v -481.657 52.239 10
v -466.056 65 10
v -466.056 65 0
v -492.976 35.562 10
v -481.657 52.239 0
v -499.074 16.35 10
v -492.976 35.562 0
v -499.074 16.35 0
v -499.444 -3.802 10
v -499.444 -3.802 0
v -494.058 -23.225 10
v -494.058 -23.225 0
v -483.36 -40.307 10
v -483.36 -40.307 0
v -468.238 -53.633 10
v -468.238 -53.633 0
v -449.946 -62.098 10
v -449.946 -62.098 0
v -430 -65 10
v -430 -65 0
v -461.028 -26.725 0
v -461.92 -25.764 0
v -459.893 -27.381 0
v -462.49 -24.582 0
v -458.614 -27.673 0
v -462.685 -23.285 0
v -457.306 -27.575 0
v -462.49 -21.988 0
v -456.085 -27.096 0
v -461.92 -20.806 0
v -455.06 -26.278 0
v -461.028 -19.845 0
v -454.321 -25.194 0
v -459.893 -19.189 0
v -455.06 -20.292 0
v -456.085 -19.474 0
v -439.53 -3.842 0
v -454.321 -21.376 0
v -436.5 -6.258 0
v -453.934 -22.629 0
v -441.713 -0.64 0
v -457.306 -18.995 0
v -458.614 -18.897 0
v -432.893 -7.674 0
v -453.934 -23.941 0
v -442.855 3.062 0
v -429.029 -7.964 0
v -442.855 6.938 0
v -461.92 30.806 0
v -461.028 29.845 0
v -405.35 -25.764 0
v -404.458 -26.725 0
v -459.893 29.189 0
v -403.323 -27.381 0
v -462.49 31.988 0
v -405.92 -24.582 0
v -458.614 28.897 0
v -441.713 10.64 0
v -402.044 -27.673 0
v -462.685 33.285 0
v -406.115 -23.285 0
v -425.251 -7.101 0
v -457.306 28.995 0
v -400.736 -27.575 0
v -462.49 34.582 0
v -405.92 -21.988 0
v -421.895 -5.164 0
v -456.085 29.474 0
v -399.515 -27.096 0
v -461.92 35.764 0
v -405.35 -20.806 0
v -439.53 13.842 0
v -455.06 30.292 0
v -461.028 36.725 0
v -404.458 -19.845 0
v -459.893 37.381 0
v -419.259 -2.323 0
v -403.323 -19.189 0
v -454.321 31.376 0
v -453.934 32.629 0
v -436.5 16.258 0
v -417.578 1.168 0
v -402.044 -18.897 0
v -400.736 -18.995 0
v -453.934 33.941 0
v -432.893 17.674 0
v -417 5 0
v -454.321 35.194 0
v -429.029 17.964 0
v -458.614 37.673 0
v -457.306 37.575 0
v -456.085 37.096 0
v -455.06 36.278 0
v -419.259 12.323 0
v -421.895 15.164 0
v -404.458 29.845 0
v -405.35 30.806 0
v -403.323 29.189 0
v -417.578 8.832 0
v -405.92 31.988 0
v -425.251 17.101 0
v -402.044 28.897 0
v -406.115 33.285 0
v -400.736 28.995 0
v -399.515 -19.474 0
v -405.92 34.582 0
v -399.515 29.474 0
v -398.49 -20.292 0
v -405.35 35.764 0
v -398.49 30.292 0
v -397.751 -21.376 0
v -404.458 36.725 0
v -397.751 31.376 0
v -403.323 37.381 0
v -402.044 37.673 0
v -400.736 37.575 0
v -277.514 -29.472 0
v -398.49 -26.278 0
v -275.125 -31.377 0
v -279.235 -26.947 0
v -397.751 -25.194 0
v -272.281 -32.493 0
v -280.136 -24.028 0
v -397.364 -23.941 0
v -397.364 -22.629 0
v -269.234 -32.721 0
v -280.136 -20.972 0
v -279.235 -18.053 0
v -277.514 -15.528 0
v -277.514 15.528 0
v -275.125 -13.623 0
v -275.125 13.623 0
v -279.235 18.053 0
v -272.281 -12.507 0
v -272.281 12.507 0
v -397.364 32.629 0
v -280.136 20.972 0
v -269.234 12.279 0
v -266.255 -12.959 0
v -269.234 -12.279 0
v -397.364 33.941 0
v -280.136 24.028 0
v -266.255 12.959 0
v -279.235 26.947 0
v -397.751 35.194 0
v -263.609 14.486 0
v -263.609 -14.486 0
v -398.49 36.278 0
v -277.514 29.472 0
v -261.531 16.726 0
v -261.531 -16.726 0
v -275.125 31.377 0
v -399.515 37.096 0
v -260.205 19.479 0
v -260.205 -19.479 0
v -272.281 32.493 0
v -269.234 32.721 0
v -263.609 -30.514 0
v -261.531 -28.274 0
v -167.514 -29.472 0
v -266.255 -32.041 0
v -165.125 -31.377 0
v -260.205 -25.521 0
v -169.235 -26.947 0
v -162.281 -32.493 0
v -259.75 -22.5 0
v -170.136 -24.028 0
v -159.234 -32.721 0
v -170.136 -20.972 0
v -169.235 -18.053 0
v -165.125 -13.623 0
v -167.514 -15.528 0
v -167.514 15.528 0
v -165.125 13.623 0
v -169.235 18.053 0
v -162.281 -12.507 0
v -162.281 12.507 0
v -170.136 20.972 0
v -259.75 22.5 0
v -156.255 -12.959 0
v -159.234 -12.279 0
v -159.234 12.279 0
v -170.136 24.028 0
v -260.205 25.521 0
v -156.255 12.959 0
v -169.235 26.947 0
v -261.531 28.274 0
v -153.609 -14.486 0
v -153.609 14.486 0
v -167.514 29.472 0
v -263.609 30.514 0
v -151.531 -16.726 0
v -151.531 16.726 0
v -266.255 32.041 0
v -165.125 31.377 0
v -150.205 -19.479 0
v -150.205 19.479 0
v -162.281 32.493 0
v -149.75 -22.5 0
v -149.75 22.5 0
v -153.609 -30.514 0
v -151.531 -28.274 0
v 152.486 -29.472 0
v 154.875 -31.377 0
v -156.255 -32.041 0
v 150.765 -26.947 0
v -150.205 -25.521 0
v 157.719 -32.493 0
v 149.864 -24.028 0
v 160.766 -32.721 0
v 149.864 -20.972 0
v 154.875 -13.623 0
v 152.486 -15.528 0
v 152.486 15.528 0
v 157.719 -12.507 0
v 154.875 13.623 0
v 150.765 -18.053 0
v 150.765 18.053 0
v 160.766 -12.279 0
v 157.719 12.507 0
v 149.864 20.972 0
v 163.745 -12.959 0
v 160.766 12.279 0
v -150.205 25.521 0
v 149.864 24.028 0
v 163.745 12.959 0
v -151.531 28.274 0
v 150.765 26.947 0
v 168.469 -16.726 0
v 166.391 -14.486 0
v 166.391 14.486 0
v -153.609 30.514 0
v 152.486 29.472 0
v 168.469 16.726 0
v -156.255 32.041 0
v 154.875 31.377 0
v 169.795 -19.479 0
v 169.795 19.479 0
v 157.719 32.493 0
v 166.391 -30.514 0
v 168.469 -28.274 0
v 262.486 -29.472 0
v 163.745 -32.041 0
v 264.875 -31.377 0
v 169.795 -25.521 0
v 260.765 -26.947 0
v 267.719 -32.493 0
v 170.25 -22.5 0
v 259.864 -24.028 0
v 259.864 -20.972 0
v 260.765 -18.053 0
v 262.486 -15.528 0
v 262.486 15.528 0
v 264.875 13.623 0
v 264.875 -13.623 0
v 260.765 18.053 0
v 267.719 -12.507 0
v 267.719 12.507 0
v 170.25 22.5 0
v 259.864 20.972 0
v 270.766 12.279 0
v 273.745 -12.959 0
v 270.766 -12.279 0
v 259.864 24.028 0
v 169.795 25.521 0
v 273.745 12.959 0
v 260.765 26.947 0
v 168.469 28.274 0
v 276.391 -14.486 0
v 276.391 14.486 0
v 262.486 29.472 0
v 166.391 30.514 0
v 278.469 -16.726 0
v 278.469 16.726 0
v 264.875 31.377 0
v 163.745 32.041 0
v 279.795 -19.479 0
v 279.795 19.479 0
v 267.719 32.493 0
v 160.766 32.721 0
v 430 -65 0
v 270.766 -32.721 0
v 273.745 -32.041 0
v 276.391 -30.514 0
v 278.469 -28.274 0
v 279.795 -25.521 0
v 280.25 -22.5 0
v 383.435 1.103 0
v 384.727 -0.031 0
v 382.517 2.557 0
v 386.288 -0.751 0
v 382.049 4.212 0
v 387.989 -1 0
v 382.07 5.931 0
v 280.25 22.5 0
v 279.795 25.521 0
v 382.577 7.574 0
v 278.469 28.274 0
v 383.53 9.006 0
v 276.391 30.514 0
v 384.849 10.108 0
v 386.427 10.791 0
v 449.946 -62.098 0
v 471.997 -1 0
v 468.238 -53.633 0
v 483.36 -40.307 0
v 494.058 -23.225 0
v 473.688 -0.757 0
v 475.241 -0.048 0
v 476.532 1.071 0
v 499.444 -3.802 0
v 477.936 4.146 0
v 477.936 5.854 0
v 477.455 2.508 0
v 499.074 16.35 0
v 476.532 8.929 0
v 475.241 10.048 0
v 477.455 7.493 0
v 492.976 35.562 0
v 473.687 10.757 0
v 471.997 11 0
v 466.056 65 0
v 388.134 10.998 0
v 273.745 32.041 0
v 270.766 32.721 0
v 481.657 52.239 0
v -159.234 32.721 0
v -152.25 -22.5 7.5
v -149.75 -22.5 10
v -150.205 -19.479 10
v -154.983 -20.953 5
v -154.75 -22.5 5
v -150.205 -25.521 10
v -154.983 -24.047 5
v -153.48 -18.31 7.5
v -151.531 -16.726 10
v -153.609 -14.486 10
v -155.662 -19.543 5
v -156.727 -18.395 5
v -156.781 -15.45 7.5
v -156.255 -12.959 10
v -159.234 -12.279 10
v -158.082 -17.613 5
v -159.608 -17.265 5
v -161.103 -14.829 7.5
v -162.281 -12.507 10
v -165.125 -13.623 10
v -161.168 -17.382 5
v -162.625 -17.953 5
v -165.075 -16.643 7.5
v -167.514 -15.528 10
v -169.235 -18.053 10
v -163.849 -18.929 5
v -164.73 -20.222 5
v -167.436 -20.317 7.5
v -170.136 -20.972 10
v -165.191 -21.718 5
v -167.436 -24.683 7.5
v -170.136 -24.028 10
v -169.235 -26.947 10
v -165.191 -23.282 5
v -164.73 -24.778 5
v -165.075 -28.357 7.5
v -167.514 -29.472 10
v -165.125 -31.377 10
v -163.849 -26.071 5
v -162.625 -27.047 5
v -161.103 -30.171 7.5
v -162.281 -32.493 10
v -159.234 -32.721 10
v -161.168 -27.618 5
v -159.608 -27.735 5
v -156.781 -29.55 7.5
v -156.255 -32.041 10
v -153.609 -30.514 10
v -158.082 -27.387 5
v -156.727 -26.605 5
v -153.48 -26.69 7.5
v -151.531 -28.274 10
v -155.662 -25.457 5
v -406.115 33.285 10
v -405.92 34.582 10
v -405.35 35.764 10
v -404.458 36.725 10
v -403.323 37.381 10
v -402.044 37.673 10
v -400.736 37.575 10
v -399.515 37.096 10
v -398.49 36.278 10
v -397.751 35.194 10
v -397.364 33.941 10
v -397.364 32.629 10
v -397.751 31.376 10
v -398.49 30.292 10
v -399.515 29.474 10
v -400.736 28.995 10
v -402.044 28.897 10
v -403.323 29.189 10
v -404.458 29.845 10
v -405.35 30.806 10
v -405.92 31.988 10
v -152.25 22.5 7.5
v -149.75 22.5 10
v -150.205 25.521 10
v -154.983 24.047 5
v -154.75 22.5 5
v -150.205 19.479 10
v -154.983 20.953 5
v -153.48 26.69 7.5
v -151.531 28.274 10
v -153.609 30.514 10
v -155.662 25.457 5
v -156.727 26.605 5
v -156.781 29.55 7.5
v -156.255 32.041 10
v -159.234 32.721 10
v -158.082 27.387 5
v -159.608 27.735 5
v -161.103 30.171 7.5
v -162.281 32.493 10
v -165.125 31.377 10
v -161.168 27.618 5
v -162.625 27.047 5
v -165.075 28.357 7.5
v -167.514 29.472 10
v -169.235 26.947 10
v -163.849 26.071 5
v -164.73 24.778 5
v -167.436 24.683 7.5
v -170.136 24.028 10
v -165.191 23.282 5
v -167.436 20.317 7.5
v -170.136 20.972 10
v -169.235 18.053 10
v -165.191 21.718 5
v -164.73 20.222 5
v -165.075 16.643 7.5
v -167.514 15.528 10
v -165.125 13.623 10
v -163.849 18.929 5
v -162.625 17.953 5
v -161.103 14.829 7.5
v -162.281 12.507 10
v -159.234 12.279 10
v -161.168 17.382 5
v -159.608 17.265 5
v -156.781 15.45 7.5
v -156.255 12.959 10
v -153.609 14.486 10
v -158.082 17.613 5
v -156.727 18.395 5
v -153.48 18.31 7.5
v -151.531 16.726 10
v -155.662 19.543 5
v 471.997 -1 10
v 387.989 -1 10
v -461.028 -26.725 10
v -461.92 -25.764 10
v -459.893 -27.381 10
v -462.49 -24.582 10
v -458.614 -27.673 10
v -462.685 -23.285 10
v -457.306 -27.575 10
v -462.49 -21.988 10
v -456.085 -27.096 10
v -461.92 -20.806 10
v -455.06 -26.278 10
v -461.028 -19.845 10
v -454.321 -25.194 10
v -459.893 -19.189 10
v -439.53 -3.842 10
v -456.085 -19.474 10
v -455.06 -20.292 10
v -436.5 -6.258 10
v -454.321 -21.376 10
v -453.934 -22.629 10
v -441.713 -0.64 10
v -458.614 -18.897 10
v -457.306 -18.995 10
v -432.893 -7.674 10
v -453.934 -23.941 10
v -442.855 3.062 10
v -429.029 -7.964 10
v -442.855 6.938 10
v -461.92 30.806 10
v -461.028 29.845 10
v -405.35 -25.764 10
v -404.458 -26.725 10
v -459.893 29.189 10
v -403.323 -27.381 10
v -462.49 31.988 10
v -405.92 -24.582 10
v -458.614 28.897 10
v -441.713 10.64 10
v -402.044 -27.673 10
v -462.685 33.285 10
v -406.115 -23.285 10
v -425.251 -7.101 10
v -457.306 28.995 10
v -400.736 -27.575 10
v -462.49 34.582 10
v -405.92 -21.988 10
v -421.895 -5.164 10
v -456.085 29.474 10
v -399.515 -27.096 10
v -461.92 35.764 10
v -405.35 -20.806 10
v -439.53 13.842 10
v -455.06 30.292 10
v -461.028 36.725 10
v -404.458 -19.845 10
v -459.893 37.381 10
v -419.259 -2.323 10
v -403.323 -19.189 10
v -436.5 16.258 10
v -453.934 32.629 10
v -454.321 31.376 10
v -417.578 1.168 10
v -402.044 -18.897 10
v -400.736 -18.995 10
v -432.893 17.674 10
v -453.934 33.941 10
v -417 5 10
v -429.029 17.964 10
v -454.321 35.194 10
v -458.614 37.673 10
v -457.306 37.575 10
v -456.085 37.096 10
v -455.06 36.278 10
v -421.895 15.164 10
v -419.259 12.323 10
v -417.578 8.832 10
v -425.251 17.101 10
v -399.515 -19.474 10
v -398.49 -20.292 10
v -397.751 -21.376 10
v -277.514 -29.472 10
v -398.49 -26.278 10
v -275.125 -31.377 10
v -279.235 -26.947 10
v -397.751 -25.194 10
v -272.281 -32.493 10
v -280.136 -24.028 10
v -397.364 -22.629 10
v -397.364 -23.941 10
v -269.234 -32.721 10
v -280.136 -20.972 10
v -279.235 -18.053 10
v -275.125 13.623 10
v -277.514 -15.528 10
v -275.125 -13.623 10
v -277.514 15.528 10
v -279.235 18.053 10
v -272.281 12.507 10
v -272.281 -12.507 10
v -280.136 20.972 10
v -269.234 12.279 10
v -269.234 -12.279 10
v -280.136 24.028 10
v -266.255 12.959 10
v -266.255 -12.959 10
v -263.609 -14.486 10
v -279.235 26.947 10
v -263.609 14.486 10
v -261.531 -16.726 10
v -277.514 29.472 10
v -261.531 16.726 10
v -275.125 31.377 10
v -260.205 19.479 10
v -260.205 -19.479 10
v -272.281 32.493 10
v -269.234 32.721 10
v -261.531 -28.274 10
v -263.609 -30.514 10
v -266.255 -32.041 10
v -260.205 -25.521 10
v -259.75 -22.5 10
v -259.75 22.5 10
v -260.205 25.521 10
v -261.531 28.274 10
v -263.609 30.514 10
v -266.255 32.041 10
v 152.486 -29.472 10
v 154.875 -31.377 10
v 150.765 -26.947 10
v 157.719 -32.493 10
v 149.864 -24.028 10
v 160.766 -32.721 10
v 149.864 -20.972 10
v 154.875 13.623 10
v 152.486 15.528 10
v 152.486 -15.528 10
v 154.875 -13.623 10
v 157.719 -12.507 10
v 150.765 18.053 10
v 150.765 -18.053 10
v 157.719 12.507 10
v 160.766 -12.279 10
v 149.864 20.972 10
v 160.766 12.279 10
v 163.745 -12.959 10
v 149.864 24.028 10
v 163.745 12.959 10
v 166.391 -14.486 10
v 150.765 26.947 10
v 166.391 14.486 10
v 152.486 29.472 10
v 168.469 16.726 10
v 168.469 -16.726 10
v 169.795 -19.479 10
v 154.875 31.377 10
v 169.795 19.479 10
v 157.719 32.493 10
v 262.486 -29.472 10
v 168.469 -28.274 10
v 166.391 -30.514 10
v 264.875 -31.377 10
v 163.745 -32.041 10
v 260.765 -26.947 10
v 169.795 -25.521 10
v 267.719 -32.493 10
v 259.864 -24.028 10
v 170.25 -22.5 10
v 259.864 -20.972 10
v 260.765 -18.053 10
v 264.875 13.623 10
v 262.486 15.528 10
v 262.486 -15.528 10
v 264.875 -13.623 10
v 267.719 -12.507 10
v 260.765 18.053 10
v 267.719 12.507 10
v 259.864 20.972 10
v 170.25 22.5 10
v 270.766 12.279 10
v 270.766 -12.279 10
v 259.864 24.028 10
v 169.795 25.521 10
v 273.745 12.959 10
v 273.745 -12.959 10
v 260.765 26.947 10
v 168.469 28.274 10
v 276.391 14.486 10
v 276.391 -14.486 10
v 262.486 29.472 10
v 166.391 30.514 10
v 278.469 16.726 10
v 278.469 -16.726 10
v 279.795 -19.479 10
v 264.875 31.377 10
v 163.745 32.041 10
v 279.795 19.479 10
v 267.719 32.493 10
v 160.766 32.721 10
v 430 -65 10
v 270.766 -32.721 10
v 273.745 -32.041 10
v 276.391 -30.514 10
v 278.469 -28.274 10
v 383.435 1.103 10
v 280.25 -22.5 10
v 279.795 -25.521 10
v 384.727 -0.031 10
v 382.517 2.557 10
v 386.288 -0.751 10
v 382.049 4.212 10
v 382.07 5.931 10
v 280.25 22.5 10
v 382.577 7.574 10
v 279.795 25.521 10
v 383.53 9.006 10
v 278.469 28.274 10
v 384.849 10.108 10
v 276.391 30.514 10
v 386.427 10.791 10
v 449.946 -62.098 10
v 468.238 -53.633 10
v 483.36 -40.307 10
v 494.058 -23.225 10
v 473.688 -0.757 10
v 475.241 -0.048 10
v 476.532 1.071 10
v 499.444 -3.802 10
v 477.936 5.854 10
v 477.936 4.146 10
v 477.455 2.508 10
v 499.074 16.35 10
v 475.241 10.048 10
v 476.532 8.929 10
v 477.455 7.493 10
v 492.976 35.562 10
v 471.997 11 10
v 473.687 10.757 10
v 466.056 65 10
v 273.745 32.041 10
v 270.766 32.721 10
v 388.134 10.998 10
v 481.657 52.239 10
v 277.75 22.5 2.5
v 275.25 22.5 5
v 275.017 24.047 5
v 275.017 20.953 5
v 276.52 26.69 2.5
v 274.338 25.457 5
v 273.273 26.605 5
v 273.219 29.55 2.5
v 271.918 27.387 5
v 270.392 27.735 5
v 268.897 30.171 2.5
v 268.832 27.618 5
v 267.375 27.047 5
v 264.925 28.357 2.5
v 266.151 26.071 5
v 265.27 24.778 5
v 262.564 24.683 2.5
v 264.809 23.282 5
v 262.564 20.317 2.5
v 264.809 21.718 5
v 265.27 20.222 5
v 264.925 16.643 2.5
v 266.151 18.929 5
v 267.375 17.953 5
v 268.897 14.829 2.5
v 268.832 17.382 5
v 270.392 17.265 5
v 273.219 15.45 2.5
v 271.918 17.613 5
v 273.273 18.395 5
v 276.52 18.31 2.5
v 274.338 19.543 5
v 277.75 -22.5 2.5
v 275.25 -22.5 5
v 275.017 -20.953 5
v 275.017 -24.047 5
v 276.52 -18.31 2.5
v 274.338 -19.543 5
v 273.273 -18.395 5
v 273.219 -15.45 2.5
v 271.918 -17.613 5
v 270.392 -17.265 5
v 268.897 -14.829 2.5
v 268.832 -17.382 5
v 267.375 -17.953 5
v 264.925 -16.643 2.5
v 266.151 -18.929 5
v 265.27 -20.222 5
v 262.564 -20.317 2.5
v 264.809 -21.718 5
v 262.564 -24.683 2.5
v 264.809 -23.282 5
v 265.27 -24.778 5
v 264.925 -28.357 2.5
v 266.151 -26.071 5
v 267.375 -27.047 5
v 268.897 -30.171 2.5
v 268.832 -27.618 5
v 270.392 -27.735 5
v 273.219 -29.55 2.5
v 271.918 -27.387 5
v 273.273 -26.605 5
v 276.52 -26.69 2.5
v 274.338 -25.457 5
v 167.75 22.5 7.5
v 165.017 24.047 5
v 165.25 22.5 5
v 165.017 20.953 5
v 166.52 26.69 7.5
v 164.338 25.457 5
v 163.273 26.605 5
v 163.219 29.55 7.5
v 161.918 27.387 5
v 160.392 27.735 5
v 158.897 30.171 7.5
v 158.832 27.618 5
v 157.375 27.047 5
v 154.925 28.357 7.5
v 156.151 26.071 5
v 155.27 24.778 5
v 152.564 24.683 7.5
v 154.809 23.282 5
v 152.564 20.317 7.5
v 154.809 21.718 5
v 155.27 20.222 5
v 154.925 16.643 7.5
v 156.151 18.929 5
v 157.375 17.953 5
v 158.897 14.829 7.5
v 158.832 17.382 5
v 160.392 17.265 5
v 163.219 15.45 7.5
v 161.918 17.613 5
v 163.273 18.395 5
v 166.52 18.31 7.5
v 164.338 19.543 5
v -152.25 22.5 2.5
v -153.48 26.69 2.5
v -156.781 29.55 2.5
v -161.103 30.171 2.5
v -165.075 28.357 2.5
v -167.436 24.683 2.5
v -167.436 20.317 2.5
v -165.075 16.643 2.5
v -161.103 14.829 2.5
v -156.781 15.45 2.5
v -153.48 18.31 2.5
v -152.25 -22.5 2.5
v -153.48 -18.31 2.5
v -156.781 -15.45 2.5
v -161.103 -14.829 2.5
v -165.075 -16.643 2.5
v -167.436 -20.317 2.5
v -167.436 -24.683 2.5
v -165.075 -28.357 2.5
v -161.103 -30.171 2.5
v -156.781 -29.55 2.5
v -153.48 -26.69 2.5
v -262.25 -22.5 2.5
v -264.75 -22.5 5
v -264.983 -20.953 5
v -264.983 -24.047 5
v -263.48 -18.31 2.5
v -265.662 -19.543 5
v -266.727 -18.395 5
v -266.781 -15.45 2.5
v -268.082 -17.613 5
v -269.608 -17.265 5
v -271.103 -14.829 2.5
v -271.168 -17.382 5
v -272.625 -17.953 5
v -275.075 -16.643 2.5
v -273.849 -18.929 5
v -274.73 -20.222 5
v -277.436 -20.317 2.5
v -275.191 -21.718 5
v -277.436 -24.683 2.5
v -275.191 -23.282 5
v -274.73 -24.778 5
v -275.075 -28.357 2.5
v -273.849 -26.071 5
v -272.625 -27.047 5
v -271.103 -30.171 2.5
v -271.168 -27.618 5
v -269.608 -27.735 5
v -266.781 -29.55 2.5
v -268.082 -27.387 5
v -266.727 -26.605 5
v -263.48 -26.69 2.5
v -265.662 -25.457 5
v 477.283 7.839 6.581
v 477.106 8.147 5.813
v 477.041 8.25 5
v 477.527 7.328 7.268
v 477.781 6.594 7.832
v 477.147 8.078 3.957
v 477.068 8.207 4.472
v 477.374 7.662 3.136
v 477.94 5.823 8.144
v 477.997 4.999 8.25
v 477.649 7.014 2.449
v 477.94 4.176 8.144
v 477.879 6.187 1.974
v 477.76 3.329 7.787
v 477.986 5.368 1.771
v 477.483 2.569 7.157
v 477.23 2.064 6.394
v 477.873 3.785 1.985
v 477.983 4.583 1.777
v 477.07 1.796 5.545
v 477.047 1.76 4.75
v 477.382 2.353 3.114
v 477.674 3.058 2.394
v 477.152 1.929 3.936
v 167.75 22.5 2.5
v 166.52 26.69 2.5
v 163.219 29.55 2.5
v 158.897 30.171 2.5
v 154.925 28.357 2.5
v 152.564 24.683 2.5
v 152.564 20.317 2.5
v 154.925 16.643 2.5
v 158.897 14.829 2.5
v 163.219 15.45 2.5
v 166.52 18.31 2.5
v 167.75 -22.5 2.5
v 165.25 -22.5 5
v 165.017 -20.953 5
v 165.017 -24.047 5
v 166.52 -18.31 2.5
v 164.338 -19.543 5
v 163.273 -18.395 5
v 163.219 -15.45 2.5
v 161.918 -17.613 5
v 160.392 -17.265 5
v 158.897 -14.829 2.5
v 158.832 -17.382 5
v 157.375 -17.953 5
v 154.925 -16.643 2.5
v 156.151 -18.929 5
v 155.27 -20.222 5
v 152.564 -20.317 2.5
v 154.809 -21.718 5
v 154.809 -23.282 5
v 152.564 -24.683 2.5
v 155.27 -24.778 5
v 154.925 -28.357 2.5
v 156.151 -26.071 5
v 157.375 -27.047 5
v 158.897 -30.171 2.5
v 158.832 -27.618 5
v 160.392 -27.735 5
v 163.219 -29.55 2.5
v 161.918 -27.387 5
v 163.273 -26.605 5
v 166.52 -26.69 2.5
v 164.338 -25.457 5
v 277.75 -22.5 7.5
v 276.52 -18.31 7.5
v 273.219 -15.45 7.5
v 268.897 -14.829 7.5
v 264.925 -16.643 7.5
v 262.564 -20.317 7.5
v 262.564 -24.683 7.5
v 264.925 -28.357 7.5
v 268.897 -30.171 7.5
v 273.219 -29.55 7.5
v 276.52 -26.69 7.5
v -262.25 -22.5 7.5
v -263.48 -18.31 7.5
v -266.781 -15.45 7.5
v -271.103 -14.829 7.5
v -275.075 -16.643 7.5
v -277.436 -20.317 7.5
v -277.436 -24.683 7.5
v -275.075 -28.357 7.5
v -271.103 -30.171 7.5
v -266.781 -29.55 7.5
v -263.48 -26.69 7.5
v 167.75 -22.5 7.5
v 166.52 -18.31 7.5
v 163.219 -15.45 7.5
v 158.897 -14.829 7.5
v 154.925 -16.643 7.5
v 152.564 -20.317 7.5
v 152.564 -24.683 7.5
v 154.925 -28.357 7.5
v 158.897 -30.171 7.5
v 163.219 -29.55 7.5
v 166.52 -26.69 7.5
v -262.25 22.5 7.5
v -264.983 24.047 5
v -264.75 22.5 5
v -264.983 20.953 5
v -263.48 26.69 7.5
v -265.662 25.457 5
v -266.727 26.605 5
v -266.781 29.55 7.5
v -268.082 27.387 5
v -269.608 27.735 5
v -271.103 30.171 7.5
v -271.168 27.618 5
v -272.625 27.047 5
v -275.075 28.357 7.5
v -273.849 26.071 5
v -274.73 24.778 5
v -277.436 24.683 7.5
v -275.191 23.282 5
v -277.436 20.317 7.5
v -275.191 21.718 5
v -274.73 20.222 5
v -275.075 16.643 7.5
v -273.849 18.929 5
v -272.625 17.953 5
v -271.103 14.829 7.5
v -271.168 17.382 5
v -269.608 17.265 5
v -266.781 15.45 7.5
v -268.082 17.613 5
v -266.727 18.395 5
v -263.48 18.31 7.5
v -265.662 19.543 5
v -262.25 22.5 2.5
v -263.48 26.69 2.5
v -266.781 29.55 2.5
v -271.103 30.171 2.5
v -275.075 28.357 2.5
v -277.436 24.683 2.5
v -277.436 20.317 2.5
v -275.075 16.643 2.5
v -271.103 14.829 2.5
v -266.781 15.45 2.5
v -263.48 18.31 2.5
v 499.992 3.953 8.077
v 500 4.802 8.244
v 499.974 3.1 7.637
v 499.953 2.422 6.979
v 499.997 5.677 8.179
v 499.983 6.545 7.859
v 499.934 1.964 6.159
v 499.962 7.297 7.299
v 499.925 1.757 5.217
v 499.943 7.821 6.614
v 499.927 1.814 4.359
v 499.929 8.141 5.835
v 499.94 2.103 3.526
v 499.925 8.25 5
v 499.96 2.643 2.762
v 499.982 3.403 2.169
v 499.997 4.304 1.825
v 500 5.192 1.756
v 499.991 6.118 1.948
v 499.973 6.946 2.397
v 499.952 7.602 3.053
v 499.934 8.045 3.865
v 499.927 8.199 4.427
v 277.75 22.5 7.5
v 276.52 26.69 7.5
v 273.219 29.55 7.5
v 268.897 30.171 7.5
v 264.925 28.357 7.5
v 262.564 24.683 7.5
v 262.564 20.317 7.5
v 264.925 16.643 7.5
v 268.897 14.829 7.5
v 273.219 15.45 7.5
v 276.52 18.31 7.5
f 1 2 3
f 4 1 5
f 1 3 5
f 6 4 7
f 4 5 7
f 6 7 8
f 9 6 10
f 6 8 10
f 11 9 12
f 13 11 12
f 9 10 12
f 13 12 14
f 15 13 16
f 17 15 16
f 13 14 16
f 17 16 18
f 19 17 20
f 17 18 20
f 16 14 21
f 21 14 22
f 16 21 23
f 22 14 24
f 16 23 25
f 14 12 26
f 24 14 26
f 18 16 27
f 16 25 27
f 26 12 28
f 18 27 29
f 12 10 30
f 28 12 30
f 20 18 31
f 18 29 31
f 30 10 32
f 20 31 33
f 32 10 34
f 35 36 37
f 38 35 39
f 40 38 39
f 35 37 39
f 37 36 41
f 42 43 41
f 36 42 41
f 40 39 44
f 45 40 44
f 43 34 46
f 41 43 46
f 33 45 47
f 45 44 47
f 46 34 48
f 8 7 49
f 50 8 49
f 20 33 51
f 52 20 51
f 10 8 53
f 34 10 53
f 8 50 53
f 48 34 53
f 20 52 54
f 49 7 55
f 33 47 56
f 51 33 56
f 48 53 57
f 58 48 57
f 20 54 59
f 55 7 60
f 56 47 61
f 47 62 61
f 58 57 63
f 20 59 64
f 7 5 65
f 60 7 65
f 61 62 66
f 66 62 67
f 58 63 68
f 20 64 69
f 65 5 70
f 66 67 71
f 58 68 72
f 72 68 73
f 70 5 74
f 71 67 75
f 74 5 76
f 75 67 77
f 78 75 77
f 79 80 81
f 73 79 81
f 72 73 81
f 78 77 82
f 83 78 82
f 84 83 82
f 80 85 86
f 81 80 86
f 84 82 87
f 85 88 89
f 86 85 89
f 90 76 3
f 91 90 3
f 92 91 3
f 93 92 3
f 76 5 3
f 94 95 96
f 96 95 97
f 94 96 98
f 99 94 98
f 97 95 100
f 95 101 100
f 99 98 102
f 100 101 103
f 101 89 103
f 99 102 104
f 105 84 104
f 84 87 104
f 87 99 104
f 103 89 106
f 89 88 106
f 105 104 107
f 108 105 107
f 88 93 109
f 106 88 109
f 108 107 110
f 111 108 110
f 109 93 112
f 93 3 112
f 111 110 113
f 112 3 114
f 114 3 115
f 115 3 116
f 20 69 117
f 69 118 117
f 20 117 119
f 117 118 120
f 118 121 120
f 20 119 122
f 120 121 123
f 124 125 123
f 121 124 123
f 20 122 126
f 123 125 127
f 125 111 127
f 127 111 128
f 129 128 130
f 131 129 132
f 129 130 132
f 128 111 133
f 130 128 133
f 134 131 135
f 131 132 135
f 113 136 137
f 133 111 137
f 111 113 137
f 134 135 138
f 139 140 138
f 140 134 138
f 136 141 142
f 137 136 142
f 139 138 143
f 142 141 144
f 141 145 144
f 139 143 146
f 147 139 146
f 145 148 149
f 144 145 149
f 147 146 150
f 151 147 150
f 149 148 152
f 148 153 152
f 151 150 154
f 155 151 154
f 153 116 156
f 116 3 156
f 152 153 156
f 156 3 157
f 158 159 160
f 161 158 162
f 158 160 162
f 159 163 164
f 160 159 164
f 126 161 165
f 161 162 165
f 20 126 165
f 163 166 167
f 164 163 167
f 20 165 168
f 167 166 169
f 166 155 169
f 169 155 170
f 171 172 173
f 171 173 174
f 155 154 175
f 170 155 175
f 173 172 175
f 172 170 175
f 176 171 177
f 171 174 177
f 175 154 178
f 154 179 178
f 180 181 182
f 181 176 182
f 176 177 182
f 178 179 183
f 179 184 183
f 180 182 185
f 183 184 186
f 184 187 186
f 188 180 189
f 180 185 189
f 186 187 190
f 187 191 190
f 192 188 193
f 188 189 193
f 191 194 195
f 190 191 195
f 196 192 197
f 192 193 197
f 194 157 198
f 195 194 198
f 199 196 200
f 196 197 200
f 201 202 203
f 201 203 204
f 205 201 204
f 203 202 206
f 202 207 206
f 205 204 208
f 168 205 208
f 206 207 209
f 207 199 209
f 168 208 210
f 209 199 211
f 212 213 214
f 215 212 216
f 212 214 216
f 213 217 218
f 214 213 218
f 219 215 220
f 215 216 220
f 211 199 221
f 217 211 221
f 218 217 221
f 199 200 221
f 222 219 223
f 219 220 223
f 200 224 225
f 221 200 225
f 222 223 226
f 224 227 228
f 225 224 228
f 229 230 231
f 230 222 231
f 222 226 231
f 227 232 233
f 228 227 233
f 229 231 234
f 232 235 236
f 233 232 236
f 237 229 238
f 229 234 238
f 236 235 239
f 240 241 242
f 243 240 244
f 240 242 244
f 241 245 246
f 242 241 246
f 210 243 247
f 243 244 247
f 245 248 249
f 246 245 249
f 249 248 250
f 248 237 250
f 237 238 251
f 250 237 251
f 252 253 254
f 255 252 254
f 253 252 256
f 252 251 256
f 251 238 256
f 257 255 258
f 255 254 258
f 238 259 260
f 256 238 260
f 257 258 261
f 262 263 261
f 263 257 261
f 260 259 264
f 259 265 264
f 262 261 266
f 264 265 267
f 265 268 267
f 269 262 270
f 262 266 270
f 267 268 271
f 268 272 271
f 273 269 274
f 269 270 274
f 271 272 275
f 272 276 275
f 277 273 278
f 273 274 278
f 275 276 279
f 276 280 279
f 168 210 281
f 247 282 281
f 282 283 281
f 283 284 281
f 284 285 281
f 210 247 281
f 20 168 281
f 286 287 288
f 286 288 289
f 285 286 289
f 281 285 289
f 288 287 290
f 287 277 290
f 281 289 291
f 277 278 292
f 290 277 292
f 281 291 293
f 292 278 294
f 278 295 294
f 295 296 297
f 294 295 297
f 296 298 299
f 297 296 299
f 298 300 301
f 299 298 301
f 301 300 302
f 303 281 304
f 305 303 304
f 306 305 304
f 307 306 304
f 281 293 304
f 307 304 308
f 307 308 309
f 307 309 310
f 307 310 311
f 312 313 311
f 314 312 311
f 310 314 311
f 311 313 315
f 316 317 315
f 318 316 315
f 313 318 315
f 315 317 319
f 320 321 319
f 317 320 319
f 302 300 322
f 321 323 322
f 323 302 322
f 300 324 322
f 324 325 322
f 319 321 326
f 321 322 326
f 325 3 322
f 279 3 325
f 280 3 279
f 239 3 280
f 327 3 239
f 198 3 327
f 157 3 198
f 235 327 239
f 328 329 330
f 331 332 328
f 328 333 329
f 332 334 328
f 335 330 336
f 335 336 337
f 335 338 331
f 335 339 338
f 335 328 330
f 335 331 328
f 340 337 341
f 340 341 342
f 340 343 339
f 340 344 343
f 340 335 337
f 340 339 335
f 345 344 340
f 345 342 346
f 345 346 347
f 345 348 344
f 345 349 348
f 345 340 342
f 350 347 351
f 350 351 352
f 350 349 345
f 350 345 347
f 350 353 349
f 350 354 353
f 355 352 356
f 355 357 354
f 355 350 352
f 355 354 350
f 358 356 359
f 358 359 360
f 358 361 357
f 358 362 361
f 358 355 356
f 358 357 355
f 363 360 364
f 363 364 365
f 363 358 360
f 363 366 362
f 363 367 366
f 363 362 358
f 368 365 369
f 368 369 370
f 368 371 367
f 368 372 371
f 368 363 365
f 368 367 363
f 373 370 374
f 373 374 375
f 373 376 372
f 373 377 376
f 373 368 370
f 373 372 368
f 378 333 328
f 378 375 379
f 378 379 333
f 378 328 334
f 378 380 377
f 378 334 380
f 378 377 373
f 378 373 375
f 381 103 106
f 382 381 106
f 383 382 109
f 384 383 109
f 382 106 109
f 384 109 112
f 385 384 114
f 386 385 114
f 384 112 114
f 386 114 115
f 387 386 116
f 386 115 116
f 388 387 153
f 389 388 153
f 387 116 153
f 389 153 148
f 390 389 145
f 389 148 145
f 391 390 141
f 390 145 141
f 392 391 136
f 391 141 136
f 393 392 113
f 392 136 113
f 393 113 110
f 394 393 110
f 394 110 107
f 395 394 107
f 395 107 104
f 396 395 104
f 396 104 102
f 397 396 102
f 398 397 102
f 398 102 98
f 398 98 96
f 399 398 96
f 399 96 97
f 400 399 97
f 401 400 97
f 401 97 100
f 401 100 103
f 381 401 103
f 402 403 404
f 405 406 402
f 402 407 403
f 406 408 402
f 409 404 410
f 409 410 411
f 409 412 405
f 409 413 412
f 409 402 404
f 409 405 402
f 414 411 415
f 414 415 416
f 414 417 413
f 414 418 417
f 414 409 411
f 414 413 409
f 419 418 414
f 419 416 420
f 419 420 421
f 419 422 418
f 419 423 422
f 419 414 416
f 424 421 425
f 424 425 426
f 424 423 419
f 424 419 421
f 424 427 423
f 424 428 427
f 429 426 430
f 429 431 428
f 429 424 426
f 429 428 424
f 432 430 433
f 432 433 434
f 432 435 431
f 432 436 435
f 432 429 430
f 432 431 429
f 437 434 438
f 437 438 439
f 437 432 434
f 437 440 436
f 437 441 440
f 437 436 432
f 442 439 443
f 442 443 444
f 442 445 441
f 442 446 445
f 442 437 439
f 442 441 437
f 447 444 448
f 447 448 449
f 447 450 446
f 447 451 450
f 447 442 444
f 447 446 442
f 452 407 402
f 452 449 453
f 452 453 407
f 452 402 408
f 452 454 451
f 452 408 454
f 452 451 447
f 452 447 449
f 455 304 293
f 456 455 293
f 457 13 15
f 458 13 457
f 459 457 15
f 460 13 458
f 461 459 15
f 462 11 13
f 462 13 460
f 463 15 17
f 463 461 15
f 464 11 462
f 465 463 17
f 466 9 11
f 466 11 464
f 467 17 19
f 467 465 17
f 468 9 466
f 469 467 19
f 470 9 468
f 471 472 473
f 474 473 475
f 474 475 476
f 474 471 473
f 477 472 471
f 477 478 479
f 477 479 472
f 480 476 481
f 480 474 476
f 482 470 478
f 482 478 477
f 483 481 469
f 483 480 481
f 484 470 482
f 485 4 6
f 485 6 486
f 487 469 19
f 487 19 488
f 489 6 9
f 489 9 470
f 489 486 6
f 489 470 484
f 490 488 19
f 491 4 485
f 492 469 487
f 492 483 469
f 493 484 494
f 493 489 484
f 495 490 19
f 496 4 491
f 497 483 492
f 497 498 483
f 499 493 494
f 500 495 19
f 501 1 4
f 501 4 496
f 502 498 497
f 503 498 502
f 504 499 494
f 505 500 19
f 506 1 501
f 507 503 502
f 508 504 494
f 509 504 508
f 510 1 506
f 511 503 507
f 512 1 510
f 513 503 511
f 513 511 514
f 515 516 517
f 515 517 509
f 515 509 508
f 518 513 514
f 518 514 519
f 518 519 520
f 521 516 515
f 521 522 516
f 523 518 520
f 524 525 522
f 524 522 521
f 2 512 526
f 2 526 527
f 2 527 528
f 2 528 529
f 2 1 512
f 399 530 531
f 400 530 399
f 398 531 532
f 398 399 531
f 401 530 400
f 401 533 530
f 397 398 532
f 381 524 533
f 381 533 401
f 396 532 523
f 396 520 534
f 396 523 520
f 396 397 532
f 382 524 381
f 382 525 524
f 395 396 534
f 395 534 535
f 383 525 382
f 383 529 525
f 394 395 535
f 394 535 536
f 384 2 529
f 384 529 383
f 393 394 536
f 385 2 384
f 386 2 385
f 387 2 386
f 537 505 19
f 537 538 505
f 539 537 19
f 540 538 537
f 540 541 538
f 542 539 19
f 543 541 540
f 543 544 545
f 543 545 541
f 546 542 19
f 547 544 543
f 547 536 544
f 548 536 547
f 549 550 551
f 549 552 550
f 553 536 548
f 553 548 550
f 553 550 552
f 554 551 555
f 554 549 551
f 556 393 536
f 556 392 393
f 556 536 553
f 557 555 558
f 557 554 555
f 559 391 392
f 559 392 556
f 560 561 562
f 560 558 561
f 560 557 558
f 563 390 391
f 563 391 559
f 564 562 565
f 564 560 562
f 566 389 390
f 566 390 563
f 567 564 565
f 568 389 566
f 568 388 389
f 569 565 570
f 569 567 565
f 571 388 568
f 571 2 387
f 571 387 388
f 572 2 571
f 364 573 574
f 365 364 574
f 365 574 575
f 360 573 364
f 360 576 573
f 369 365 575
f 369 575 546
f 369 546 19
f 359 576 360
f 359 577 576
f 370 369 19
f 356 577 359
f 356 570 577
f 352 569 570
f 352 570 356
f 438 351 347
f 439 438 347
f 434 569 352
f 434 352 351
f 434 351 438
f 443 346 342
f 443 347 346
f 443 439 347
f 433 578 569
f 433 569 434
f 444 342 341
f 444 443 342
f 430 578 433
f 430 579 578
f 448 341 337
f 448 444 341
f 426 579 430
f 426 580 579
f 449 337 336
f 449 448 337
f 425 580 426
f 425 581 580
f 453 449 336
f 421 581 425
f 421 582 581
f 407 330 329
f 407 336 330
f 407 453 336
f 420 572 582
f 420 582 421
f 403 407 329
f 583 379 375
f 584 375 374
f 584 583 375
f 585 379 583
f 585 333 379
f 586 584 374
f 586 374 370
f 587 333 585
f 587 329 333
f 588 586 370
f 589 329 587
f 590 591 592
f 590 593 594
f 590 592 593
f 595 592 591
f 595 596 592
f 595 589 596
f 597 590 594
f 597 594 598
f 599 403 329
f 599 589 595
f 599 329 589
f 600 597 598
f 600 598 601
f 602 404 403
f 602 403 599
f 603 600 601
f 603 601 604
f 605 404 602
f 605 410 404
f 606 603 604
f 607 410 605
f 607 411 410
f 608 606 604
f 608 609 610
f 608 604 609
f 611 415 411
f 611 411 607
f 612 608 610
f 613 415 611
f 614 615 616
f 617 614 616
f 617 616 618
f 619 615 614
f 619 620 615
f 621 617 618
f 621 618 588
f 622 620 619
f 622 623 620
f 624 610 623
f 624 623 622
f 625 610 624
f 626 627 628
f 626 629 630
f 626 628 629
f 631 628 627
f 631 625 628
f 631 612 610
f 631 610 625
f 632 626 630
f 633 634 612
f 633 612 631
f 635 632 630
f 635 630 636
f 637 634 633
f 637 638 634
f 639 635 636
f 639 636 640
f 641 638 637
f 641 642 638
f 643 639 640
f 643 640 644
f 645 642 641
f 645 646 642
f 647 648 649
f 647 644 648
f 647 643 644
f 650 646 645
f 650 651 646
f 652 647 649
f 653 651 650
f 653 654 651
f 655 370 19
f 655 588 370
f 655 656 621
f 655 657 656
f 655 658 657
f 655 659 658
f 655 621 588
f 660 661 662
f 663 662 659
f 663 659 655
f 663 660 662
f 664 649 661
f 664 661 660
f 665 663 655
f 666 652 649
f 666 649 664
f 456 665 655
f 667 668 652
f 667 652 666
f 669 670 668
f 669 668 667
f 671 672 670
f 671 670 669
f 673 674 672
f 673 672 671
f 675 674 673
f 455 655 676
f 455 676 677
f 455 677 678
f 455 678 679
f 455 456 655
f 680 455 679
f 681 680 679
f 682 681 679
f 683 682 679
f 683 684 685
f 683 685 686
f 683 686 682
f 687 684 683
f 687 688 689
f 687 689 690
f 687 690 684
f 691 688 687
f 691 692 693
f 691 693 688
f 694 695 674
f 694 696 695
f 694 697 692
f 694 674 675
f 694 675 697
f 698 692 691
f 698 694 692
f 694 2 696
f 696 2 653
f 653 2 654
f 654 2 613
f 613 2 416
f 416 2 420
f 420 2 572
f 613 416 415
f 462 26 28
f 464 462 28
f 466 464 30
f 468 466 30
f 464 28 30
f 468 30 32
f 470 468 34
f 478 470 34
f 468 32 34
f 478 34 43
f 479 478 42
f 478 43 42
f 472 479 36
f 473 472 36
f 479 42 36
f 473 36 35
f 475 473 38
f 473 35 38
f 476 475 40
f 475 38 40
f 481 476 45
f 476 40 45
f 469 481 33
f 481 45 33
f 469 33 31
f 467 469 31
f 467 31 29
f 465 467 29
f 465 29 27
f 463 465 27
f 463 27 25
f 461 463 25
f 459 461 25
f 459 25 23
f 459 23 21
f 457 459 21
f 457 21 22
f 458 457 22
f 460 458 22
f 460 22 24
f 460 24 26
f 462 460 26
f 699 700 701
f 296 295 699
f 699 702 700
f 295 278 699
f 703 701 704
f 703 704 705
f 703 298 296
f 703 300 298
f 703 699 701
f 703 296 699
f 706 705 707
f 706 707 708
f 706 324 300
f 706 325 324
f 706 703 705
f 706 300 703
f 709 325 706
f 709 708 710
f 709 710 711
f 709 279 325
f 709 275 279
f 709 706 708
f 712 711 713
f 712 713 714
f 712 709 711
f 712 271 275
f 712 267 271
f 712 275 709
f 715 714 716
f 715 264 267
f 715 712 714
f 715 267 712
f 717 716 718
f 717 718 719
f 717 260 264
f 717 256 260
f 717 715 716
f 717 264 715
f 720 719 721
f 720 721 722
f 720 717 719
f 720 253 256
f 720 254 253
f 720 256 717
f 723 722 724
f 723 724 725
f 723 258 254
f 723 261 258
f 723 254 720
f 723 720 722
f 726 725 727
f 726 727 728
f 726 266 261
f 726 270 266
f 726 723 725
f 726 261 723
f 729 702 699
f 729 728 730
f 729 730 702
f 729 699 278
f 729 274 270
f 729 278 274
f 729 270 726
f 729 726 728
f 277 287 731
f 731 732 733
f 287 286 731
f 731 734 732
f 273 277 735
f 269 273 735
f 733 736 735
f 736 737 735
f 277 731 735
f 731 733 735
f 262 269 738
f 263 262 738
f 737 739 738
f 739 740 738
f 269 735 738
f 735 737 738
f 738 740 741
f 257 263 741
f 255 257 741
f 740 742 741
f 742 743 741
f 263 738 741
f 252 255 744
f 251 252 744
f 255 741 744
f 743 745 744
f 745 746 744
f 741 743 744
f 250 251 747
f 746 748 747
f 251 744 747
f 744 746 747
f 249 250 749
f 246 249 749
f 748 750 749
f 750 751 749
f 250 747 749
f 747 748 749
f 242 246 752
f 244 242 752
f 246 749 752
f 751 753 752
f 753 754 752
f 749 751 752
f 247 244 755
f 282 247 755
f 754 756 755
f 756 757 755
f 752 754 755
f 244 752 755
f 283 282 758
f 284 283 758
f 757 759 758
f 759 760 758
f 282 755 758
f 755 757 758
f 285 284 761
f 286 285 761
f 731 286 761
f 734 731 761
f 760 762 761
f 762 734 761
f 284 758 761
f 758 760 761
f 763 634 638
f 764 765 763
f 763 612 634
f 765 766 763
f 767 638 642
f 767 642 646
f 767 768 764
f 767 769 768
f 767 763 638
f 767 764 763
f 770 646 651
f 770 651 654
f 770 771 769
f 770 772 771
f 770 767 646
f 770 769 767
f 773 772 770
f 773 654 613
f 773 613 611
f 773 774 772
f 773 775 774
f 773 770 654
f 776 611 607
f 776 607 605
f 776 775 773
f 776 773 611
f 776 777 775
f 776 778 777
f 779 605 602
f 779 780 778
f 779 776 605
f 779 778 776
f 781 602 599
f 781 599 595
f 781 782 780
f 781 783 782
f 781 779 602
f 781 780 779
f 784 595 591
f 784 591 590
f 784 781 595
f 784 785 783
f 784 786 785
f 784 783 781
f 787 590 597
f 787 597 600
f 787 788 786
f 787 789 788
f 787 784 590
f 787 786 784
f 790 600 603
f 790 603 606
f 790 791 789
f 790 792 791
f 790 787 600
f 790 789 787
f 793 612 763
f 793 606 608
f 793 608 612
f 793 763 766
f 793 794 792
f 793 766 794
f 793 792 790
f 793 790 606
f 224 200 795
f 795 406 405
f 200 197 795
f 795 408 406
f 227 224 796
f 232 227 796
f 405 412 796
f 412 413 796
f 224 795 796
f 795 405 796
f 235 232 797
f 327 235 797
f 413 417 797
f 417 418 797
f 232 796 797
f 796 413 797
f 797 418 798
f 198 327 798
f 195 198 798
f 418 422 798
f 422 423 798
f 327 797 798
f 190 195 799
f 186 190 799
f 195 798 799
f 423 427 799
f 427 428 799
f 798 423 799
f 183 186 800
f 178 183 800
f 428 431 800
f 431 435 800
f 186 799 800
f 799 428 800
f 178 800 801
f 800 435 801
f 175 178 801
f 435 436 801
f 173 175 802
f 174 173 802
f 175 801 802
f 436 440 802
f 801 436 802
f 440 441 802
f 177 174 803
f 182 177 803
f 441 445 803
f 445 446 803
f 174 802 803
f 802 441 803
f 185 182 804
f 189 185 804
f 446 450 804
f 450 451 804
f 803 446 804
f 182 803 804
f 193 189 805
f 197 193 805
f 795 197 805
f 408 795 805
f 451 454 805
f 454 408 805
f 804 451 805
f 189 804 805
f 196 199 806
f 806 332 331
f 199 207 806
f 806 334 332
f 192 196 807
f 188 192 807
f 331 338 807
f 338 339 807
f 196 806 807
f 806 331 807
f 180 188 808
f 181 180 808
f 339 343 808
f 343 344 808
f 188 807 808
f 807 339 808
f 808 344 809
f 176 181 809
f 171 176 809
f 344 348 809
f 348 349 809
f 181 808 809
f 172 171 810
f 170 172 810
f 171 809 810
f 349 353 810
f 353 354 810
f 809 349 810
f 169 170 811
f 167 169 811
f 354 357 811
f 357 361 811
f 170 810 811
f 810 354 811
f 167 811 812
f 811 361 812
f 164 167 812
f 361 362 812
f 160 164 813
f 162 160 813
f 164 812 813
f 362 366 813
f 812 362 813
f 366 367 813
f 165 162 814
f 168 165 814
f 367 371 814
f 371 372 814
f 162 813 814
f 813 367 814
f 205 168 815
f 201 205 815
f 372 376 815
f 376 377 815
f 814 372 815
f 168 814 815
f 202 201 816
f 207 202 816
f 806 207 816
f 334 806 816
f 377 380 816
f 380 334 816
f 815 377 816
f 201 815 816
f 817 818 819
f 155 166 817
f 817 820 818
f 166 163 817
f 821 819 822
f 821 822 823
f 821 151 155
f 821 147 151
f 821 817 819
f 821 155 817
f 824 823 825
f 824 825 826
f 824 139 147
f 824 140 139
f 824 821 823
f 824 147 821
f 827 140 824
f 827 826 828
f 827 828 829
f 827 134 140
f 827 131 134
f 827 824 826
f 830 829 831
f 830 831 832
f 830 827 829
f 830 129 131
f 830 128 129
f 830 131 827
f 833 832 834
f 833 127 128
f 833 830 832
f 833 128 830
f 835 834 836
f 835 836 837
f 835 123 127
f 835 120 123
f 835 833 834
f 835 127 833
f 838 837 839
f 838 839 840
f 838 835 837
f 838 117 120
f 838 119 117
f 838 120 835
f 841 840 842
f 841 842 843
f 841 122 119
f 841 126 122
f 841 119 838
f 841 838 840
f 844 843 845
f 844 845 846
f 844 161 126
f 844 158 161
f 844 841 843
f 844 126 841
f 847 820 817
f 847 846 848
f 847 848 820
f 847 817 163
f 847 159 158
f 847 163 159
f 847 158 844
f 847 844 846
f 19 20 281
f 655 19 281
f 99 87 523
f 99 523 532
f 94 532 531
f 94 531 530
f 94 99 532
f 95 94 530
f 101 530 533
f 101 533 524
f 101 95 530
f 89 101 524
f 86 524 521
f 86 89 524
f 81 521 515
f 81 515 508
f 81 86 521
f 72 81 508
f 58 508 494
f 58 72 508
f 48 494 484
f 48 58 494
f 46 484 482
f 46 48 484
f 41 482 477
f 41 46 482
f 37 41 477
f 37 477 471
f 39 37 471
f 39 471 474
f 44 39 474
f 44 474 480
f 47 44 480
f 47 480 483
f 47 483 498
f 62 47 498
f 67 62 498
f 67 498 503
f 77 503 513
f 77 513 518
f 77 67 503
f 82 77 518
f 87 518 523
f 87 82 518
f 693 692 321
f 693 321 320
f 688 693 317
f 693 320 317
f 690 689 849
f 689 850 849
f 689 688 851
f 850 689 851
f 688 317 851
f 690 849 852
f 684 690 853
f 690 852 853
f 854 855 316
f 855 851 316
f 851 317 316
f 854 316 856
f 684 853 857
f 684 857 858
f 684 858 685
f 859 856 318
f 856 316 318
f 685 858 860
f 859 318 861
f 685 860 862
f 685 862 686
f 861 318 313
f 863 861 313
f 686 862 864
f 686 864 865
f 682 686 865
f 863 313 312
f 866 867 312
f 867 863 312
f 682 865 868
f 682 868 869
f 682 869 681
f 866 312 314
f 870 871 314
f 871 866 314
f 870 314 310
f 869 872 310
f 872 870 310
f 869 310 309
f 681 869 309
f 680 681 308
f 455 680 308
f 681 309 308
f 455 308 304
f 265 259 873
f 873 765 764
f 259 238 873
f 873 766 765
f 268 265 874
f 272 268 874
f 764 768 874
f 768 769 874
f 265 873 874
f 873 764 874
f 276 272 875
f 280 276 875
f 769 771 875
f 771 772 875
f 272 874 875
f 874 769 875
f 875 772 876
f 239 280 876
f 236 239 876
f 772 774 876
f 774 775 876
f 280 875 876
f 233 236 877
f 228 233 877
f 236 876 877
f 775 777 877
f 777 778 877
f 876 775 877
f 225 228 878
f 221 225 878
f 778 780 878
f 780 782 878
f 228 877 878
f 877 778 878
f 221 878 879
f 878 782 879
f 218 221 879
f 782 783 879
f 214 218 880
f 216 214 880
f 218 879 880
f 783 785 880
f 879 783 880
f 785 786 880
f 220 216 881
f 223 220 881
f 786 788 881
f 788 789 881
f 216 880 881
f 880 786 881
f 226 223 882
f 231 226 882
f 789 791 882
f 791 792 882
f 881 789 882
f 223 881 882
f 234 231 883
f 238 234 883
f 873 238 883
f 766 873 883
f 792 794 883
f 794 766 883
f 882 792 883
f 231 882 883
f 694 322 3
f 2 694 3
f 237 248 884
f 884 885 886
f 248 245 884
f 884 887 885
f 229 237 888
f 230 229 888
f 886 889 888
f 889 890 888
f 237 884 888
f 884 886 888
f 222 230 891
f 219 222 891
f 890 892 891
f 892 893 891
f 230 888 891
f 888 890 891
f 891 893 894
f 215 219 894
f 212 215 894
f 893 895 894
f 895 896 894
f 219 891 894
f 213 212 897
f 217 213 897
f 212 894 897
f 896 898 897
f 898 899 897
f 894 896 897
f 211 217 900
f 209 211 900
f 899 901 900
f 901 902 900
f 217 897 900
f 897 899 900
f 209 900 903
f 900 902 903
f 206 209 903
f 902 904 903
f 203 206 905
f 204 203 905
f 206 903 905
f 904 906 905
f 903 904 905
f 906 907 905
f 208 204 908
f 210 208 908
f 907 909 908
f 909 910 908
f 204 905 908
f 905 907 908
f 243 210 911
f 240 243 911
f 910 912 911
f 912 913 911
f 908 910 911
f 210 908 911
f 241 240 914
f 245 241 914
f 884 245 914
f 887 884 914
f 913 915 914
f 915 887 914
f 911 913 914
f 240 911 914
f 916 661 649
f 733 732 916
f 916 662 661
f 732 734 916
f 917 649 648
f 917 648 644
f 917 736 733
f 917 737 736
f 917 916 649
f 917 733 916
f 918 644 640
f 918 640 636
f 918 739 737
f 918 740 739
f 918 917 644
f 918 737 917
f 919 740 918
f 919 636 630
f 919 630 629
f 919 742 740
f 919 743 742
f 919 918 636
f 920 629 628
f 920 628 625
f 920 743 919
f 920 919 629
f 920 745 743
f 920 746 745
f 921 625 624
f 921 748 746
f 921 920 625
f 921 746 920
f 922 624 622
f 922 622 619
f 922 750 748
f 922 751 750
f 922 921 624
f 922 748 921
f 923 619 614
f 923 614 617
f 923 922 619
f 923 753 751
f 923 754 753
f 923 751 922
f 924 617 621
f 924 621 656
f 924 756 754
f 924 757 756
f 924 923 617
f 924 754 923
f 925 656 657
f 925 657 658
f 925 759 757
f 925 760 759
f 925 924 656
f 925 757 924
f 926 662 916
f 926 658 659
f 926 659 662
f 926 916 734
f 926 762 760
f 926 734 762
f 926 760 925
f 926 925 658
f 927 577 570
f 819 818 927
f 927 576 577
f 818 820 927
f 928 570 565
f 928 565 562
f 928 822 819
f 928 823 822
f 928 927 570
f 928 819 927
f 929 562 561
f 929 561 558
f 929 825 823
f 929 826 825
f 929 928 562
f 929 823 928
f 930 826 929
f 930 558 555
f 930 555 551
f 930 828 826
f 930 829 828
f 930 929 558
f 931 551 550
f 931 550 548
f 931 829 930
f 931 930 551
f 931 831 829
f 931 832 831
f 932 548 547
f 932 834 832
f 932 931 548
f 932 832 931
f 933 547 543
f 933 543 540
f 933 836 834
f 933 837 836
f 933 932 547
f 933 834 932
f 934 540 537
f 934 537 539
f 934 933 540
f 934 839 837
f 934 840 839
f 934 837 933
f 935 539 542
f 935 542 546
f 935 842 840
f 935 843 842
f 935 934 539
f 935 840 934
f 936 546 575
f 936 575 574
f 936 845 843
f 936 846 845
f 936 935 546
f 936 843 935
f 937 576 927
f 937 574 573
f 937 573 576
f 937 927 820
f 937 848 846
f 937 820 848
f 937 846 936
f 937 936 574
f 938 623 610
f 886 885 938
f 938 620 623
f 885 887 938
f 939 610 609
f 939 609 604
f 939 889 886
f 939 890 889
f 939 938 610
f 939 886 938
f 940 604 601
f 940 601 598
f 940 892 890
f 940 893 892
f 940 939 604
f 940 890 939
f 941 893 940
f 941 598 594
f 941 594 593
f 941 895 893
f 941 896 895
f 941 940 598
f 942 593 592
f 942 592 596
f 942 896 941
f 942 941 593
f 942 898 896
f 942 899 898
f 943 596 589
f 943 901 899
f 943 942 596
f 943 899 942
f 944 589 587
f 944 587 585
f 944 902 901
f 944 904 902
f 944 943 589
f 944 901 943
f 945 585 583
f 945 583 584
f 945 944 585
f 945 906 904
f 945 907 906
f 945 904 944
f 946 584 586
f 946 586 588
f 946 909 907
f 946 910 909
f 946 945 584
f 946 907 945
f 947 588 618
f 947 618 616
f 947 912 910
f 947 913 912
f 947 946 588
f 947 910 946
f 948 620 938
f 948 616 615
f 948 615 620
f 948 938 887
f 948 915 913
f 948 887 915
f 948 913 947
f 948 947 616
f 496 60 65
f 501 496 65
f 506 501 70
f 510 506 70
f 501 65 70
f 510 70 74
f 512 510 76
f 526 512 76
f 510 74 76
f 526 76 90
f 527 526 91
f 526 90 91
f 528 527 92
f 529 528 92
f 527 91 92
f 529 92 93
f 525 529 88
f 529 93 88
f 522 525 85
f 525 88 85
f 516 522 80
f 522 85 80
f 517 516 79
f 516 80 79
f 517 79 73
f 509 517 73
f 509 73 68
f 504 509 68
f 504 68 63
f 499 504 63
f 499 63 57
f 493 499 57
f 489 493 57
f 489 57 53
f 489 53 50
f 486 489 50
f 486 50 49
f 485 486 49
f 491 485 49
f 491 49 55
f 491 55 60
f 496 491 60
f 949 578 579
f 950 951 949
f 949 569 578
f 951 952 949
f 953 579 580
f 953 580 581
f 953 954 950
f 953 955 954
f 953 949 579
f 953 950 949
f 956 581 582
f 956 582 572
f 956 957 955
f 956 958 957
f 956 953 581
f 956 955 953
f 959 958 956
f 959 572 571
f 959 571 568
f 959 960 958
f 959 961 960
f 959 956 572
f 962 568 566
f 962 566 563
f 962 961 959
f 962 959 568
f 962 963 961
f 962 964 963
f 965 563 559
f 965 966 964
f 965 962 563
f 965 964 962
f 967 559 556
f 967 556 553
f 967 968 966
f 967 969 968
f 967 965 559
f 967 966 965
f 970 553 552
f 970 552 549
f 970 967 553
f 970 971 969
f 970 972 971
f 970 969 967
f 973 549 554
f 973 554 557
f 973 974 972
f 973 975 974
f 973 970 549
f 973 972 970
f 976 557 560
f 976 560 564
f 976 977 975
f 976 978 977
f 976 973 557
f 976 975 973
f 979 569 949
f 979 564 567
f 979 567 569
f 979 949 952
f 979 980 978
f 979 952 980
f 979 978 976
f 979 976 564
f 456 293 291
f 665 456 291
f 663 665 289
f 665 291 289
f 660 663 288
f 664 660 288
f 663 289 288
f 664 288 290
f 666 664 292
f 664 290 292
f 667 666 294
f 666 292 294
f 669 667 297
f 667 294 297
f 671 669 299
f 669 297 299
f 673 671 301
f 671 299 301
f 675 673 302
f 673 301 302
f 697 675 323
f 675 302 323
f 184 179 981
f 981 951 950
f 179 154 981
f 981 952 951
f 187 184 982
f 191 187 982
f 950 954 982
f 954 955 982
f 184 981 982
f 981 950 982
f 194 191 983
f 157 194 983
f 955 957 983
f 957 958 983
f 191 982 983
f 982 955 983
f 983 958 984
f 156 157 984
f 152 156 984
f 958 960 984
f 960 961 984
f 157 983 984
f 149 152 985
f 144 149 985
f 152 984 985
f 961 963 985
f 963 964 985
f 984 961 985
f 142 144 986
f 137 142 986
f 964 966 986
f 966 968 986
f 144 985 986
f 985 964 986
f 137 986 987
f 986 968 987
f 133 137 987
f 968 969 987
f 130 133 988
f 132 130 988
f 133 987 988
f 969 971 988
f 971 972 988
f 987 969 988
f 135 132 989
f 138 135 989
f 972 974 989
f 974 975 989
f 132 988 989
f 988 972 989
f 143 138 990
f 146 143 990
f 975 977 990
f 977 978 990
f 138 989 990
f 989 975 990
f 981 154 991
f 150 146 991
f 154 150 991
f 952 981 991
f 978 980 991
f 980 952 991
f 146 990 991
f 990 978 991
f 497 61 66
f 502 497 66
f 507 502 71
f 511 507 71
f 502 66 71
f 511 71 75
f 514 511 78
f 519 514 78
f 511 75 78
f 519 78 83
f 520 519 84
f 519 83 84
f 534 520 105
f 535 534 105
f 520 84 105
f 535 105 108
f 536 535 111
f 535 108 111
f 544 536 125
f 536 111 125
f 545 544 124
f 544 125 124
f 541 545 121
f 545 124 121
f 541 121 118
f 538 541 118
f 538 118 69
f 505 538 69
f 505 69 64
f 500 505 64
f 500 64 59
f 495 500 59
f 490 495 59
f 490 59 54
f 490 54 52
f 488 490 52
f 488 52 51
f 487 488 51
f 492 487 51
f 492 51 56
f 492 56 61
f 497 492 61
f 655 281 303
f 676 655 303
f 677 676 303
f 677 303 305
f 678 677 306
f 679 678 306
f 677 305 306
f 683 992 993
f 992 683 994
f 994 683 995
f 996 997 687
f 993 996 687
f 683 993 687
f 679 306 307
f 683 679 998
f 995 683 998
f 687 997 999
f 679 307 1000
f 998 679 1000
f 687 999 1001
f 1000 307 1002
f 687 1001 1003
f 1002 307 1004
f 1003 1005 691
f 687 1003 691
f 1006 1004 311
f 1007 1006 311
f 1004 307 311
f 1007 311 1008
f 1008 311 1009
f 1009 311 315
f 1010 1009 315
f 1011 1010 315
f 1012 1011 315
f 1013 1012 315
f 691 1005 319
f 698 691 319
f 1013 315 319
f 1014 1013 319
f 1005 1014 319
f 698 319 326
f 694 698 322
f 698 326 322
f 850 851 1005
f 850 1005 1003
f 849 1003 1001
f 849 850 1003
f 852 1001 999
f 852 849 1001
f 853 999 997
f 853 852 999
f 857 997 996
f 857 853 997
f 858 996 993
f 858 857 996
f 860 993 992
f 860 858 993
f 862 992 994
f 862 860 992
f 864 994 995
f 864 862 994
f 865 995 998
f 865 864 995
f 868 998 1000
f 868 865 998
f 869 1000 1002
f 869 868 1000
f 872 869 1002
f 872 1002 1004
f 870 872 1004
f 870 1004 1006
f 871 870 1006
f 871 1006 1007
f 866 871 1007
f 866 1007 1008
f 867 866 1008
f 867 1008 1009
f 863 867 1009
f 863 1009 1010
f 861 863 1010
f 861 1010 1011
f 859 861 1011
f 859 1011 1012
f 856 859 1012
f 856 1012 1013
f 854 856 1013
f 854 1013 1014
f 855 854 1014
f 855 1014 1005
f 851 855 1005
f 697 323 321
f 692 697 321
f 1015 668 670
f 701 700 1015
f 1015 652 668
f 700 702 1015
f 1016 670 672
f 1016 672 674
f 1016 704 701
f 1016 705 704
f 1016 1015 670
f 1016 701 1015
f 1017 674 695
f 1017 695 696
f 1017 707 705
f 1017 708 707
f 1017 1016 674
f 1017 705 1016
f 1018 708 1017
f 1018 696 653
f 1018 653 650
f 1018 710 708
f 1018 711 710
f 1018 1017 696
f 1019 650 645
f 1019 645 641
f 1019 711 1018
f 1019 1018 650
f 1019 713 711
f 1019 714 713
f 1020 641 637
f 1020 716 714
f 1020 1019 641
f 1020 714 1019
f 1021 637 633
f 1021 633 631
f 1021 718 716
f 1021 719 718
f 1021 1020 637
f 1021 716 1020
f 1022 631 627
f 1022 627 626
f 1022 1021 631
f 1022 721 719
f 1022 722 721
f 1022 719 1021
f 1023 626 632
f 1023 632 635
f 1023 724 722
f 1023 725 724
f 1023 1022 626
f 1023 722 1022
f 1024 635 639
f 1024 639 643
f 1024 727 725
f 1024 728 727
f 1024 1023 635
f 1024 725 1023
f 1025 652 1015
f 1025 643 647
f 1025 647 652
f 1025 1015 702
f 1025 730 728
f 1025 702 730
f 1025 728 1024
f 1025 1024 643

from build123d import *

# Parameters (mm, degrees)
F0_R     = 3.4
F0_R_2   = 5.25
F0_R_3   = 13
F1_DEPTH = 10
F3_D     = 8.8
F5_R     = 3.25
F6_DEPTH = 43.0009999364
F7_SIZE  = 5
F8_SIZE  = 5
F9_SIZE  = 4.99999


# Not quite as in the source:
# - a fillet or chamfer is up to 0.001 mm smaller than in the source, because OpenCascade refuses the exact size
# - ends of sketch curves that miss each other by under 0.0002 mm in the source are joined


with BuildPart() as f1:
    # F0 (on Top) → F1 (new body)
    with BuildSketch(Plane.XY):
        with BuildLine():
            Line((466.055512, 65), (-466.055513, 65))
            ThreePointArc((-466.055513, 65), (-497.4536877881, -13.7082870352), (-430, -65))
            Line((-430, -65), (430, -65))
            ThreePointArc((430, -65), (497.4536879026, -13.7082866222), (466.055512, 65))
        make_face()
        with Locations((-458.285, -23.285)):
            Circle(F0_R, mode=Mode.SUBTRACT)
        with Locations((-401.715, -23.285)):
            Circle(F0_R, mode=Mode.SUBTRACT)
        with Locations((-270, -22.5)):
            Circle(F0_R_2, mode=Mode.SUBTRACT)
        with Locations((-160, -22.5)):
            Circle(F0_R_2, mode=Mode.SUBTRACT)
        with Locations((160, -22.5)):
            Circle(F0_R_2, mode=Mode.SUBTRACT)
        with Locations((270, -22.5)):
            Circle(F0_R_2, mode=Mode.SUBTRACT)
        with Locations((-430, 5)):
            Circle(F0_R_3, mode=Mode.SUBTRACT)
        with Locations((-270, 22.5)):
            Circle(F0_R_2, mode=Mode.SUBTRACT)
        with Locations((-160, 22.5)):
            Circle(F0_R_2, mode=Mode.SUBTRACT)
        with Locations((-458.285, 33.285)):
            Circle(F0_R, mode=Mode.SUBTRACT)
        with Locations((-401.715, 33.285)):
            Circle(F0_R, mode=Mode.SUBTRACT)
        with Locations((160, 22.5)):
            Circle(F0_R_2, mode=Mode.SUBTRACT)
        with BuildLine():
            ThreePointArc((471.997057, 10.999994999), (477.9971689997, 5.000051), (471.997169, -1.000005))
            Line((471.997169, -1.000005), (387.989411, -1))
            ThreePointArc((387.989411, -1), (381.9976061696, 5.0724232034), (388.1342589922, 10.9984286567))
            Line((388.1342589922, 10.9984286567), (471.997057, 10.999994999))
        make_face(mode=Mode.SUBTRACT)
        with Locations((270, 22.5)):
            Circle(F0_R_2, mode=Mode.SUBTRACT)
    extrude(amount=F1_DEPTH)

    # F3 (through all)
    with Locations(Plane.XY.offset(10)):
        with Locations((-458.285, -23.285), (-401.715, -23.285), (-401.715, 33.285), (-458.285, 33.285)):
            Hole(F3_D / 2)

    # F5 (on offset) → F6 (cut, through all)
    with BuildSketch(Plane.YZ.offset(457)):
        with Locations((5, 5)):
            Circle(F5_R)
    extrude(amount=F6_DEPTH, mode=Mode.SUBTRACT)

    # F7
    f7_edges = [f1.edges().sort_by_distance(p)[0] for p in [
        (-275.25, -22.5, 10),
        (-275.25, 22.5, 10),
        (-165.25, -22.5, 10),
        (-165.25, 22.5, 10),
    ]]
    chamfer(f7_edges, length=F7_SIZE)

    # F8
    f8_edges = [f1.edges().sort_by_distance(p)[0] for p in [
        (264.75, 22.5, 10),
        (264.75, -22.5, 10),
        (154.75, -22.5, 10),
        (154.75, 22.5, 10),
    ]]
    chamfer(f8_edges, length=F8_SIZE)

    # F9 (size 5 in the source; OpenCascade refuses exactly that, so slightly less here)
    f9_edges = [f1.edges().sort_by_distance(p)[0] for p in [
        (264.75, -22.5, 0),
        (264.75, 22.5, 0),
        (154.75, 22.5, 0),
        (154.75, -22.5, 0),
        (-165.25, 22.5, 0),
        (-165.25, -22.5, 0),
        (-275.25, 22.5, 0),
        (-275.25, -22.5, 0),
    ]]
    chamfer(f9_edges, length=F9_SIZE)


solid = f1.part
